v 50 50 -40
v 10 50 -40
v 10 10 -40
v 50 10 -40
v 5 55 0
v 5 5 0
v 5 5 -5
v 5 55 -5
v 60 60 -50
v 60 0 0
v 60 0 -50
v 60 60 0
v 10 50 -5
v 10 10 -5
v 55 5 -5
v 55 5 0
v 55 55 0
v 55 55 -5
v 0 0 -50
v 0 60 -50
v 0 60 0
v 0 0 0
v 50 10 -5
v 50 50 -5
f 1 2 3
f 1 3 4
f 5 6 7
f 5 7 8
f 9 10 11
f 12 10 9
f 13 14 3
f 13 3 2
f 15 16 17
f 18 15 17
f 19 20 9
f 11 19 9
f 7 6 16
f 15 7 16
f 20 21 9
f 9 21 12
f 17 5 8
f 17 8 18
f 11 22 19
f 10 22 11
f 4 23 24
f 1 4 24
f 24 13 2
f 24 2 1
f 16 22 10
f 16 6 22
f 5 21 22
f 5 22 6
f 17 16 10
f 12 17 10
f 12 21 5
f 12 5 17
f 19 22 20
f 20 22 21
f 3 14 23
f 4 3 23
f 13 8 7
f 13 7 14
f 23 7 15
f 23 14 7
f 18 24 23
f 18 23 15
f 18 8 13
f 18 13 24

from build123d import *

# Parameters (mm, degrees)
F0_W     = 60
F0_H     = 60
F1_DEPTH = 50
F2_W     = 40
F2_H     = 40
F3_DEPTH = 40
F4_W     = 50
F4_H     = 50
F5_DEPTH = 5


# Not quite as in the source:
# - a feature names something its author has since deleted; it is built from what else it names


with BuildPart() as f1:
    # F0 (on Top) → F1 (new body)
    with BuildSketch(Plane.XY):
        with Locations((30, 30)):
            Rectangle(F0_W, F0_H)
    extrude(amount=-F1_DEPTH)

    # F2 (on Top) → F3 (cut)
    with BuildSketch(Plane.XY):
        with Locations((30, 30)):
            Rectangle(F2_W, F2_H)
    extrude(amount=-F3_DEPTH, mode=Mode.SUBTRACT)

    # F4 (on Top) → F5 (cut)
    with BuildSketch(Plane.XY):
        with Locations((30, 30)):
            Rectangle(F4_W, F4_H)
    extrude(amount=-F5_DEPTH, mode=Mode.SUBTRACT)


solid = f1.part
